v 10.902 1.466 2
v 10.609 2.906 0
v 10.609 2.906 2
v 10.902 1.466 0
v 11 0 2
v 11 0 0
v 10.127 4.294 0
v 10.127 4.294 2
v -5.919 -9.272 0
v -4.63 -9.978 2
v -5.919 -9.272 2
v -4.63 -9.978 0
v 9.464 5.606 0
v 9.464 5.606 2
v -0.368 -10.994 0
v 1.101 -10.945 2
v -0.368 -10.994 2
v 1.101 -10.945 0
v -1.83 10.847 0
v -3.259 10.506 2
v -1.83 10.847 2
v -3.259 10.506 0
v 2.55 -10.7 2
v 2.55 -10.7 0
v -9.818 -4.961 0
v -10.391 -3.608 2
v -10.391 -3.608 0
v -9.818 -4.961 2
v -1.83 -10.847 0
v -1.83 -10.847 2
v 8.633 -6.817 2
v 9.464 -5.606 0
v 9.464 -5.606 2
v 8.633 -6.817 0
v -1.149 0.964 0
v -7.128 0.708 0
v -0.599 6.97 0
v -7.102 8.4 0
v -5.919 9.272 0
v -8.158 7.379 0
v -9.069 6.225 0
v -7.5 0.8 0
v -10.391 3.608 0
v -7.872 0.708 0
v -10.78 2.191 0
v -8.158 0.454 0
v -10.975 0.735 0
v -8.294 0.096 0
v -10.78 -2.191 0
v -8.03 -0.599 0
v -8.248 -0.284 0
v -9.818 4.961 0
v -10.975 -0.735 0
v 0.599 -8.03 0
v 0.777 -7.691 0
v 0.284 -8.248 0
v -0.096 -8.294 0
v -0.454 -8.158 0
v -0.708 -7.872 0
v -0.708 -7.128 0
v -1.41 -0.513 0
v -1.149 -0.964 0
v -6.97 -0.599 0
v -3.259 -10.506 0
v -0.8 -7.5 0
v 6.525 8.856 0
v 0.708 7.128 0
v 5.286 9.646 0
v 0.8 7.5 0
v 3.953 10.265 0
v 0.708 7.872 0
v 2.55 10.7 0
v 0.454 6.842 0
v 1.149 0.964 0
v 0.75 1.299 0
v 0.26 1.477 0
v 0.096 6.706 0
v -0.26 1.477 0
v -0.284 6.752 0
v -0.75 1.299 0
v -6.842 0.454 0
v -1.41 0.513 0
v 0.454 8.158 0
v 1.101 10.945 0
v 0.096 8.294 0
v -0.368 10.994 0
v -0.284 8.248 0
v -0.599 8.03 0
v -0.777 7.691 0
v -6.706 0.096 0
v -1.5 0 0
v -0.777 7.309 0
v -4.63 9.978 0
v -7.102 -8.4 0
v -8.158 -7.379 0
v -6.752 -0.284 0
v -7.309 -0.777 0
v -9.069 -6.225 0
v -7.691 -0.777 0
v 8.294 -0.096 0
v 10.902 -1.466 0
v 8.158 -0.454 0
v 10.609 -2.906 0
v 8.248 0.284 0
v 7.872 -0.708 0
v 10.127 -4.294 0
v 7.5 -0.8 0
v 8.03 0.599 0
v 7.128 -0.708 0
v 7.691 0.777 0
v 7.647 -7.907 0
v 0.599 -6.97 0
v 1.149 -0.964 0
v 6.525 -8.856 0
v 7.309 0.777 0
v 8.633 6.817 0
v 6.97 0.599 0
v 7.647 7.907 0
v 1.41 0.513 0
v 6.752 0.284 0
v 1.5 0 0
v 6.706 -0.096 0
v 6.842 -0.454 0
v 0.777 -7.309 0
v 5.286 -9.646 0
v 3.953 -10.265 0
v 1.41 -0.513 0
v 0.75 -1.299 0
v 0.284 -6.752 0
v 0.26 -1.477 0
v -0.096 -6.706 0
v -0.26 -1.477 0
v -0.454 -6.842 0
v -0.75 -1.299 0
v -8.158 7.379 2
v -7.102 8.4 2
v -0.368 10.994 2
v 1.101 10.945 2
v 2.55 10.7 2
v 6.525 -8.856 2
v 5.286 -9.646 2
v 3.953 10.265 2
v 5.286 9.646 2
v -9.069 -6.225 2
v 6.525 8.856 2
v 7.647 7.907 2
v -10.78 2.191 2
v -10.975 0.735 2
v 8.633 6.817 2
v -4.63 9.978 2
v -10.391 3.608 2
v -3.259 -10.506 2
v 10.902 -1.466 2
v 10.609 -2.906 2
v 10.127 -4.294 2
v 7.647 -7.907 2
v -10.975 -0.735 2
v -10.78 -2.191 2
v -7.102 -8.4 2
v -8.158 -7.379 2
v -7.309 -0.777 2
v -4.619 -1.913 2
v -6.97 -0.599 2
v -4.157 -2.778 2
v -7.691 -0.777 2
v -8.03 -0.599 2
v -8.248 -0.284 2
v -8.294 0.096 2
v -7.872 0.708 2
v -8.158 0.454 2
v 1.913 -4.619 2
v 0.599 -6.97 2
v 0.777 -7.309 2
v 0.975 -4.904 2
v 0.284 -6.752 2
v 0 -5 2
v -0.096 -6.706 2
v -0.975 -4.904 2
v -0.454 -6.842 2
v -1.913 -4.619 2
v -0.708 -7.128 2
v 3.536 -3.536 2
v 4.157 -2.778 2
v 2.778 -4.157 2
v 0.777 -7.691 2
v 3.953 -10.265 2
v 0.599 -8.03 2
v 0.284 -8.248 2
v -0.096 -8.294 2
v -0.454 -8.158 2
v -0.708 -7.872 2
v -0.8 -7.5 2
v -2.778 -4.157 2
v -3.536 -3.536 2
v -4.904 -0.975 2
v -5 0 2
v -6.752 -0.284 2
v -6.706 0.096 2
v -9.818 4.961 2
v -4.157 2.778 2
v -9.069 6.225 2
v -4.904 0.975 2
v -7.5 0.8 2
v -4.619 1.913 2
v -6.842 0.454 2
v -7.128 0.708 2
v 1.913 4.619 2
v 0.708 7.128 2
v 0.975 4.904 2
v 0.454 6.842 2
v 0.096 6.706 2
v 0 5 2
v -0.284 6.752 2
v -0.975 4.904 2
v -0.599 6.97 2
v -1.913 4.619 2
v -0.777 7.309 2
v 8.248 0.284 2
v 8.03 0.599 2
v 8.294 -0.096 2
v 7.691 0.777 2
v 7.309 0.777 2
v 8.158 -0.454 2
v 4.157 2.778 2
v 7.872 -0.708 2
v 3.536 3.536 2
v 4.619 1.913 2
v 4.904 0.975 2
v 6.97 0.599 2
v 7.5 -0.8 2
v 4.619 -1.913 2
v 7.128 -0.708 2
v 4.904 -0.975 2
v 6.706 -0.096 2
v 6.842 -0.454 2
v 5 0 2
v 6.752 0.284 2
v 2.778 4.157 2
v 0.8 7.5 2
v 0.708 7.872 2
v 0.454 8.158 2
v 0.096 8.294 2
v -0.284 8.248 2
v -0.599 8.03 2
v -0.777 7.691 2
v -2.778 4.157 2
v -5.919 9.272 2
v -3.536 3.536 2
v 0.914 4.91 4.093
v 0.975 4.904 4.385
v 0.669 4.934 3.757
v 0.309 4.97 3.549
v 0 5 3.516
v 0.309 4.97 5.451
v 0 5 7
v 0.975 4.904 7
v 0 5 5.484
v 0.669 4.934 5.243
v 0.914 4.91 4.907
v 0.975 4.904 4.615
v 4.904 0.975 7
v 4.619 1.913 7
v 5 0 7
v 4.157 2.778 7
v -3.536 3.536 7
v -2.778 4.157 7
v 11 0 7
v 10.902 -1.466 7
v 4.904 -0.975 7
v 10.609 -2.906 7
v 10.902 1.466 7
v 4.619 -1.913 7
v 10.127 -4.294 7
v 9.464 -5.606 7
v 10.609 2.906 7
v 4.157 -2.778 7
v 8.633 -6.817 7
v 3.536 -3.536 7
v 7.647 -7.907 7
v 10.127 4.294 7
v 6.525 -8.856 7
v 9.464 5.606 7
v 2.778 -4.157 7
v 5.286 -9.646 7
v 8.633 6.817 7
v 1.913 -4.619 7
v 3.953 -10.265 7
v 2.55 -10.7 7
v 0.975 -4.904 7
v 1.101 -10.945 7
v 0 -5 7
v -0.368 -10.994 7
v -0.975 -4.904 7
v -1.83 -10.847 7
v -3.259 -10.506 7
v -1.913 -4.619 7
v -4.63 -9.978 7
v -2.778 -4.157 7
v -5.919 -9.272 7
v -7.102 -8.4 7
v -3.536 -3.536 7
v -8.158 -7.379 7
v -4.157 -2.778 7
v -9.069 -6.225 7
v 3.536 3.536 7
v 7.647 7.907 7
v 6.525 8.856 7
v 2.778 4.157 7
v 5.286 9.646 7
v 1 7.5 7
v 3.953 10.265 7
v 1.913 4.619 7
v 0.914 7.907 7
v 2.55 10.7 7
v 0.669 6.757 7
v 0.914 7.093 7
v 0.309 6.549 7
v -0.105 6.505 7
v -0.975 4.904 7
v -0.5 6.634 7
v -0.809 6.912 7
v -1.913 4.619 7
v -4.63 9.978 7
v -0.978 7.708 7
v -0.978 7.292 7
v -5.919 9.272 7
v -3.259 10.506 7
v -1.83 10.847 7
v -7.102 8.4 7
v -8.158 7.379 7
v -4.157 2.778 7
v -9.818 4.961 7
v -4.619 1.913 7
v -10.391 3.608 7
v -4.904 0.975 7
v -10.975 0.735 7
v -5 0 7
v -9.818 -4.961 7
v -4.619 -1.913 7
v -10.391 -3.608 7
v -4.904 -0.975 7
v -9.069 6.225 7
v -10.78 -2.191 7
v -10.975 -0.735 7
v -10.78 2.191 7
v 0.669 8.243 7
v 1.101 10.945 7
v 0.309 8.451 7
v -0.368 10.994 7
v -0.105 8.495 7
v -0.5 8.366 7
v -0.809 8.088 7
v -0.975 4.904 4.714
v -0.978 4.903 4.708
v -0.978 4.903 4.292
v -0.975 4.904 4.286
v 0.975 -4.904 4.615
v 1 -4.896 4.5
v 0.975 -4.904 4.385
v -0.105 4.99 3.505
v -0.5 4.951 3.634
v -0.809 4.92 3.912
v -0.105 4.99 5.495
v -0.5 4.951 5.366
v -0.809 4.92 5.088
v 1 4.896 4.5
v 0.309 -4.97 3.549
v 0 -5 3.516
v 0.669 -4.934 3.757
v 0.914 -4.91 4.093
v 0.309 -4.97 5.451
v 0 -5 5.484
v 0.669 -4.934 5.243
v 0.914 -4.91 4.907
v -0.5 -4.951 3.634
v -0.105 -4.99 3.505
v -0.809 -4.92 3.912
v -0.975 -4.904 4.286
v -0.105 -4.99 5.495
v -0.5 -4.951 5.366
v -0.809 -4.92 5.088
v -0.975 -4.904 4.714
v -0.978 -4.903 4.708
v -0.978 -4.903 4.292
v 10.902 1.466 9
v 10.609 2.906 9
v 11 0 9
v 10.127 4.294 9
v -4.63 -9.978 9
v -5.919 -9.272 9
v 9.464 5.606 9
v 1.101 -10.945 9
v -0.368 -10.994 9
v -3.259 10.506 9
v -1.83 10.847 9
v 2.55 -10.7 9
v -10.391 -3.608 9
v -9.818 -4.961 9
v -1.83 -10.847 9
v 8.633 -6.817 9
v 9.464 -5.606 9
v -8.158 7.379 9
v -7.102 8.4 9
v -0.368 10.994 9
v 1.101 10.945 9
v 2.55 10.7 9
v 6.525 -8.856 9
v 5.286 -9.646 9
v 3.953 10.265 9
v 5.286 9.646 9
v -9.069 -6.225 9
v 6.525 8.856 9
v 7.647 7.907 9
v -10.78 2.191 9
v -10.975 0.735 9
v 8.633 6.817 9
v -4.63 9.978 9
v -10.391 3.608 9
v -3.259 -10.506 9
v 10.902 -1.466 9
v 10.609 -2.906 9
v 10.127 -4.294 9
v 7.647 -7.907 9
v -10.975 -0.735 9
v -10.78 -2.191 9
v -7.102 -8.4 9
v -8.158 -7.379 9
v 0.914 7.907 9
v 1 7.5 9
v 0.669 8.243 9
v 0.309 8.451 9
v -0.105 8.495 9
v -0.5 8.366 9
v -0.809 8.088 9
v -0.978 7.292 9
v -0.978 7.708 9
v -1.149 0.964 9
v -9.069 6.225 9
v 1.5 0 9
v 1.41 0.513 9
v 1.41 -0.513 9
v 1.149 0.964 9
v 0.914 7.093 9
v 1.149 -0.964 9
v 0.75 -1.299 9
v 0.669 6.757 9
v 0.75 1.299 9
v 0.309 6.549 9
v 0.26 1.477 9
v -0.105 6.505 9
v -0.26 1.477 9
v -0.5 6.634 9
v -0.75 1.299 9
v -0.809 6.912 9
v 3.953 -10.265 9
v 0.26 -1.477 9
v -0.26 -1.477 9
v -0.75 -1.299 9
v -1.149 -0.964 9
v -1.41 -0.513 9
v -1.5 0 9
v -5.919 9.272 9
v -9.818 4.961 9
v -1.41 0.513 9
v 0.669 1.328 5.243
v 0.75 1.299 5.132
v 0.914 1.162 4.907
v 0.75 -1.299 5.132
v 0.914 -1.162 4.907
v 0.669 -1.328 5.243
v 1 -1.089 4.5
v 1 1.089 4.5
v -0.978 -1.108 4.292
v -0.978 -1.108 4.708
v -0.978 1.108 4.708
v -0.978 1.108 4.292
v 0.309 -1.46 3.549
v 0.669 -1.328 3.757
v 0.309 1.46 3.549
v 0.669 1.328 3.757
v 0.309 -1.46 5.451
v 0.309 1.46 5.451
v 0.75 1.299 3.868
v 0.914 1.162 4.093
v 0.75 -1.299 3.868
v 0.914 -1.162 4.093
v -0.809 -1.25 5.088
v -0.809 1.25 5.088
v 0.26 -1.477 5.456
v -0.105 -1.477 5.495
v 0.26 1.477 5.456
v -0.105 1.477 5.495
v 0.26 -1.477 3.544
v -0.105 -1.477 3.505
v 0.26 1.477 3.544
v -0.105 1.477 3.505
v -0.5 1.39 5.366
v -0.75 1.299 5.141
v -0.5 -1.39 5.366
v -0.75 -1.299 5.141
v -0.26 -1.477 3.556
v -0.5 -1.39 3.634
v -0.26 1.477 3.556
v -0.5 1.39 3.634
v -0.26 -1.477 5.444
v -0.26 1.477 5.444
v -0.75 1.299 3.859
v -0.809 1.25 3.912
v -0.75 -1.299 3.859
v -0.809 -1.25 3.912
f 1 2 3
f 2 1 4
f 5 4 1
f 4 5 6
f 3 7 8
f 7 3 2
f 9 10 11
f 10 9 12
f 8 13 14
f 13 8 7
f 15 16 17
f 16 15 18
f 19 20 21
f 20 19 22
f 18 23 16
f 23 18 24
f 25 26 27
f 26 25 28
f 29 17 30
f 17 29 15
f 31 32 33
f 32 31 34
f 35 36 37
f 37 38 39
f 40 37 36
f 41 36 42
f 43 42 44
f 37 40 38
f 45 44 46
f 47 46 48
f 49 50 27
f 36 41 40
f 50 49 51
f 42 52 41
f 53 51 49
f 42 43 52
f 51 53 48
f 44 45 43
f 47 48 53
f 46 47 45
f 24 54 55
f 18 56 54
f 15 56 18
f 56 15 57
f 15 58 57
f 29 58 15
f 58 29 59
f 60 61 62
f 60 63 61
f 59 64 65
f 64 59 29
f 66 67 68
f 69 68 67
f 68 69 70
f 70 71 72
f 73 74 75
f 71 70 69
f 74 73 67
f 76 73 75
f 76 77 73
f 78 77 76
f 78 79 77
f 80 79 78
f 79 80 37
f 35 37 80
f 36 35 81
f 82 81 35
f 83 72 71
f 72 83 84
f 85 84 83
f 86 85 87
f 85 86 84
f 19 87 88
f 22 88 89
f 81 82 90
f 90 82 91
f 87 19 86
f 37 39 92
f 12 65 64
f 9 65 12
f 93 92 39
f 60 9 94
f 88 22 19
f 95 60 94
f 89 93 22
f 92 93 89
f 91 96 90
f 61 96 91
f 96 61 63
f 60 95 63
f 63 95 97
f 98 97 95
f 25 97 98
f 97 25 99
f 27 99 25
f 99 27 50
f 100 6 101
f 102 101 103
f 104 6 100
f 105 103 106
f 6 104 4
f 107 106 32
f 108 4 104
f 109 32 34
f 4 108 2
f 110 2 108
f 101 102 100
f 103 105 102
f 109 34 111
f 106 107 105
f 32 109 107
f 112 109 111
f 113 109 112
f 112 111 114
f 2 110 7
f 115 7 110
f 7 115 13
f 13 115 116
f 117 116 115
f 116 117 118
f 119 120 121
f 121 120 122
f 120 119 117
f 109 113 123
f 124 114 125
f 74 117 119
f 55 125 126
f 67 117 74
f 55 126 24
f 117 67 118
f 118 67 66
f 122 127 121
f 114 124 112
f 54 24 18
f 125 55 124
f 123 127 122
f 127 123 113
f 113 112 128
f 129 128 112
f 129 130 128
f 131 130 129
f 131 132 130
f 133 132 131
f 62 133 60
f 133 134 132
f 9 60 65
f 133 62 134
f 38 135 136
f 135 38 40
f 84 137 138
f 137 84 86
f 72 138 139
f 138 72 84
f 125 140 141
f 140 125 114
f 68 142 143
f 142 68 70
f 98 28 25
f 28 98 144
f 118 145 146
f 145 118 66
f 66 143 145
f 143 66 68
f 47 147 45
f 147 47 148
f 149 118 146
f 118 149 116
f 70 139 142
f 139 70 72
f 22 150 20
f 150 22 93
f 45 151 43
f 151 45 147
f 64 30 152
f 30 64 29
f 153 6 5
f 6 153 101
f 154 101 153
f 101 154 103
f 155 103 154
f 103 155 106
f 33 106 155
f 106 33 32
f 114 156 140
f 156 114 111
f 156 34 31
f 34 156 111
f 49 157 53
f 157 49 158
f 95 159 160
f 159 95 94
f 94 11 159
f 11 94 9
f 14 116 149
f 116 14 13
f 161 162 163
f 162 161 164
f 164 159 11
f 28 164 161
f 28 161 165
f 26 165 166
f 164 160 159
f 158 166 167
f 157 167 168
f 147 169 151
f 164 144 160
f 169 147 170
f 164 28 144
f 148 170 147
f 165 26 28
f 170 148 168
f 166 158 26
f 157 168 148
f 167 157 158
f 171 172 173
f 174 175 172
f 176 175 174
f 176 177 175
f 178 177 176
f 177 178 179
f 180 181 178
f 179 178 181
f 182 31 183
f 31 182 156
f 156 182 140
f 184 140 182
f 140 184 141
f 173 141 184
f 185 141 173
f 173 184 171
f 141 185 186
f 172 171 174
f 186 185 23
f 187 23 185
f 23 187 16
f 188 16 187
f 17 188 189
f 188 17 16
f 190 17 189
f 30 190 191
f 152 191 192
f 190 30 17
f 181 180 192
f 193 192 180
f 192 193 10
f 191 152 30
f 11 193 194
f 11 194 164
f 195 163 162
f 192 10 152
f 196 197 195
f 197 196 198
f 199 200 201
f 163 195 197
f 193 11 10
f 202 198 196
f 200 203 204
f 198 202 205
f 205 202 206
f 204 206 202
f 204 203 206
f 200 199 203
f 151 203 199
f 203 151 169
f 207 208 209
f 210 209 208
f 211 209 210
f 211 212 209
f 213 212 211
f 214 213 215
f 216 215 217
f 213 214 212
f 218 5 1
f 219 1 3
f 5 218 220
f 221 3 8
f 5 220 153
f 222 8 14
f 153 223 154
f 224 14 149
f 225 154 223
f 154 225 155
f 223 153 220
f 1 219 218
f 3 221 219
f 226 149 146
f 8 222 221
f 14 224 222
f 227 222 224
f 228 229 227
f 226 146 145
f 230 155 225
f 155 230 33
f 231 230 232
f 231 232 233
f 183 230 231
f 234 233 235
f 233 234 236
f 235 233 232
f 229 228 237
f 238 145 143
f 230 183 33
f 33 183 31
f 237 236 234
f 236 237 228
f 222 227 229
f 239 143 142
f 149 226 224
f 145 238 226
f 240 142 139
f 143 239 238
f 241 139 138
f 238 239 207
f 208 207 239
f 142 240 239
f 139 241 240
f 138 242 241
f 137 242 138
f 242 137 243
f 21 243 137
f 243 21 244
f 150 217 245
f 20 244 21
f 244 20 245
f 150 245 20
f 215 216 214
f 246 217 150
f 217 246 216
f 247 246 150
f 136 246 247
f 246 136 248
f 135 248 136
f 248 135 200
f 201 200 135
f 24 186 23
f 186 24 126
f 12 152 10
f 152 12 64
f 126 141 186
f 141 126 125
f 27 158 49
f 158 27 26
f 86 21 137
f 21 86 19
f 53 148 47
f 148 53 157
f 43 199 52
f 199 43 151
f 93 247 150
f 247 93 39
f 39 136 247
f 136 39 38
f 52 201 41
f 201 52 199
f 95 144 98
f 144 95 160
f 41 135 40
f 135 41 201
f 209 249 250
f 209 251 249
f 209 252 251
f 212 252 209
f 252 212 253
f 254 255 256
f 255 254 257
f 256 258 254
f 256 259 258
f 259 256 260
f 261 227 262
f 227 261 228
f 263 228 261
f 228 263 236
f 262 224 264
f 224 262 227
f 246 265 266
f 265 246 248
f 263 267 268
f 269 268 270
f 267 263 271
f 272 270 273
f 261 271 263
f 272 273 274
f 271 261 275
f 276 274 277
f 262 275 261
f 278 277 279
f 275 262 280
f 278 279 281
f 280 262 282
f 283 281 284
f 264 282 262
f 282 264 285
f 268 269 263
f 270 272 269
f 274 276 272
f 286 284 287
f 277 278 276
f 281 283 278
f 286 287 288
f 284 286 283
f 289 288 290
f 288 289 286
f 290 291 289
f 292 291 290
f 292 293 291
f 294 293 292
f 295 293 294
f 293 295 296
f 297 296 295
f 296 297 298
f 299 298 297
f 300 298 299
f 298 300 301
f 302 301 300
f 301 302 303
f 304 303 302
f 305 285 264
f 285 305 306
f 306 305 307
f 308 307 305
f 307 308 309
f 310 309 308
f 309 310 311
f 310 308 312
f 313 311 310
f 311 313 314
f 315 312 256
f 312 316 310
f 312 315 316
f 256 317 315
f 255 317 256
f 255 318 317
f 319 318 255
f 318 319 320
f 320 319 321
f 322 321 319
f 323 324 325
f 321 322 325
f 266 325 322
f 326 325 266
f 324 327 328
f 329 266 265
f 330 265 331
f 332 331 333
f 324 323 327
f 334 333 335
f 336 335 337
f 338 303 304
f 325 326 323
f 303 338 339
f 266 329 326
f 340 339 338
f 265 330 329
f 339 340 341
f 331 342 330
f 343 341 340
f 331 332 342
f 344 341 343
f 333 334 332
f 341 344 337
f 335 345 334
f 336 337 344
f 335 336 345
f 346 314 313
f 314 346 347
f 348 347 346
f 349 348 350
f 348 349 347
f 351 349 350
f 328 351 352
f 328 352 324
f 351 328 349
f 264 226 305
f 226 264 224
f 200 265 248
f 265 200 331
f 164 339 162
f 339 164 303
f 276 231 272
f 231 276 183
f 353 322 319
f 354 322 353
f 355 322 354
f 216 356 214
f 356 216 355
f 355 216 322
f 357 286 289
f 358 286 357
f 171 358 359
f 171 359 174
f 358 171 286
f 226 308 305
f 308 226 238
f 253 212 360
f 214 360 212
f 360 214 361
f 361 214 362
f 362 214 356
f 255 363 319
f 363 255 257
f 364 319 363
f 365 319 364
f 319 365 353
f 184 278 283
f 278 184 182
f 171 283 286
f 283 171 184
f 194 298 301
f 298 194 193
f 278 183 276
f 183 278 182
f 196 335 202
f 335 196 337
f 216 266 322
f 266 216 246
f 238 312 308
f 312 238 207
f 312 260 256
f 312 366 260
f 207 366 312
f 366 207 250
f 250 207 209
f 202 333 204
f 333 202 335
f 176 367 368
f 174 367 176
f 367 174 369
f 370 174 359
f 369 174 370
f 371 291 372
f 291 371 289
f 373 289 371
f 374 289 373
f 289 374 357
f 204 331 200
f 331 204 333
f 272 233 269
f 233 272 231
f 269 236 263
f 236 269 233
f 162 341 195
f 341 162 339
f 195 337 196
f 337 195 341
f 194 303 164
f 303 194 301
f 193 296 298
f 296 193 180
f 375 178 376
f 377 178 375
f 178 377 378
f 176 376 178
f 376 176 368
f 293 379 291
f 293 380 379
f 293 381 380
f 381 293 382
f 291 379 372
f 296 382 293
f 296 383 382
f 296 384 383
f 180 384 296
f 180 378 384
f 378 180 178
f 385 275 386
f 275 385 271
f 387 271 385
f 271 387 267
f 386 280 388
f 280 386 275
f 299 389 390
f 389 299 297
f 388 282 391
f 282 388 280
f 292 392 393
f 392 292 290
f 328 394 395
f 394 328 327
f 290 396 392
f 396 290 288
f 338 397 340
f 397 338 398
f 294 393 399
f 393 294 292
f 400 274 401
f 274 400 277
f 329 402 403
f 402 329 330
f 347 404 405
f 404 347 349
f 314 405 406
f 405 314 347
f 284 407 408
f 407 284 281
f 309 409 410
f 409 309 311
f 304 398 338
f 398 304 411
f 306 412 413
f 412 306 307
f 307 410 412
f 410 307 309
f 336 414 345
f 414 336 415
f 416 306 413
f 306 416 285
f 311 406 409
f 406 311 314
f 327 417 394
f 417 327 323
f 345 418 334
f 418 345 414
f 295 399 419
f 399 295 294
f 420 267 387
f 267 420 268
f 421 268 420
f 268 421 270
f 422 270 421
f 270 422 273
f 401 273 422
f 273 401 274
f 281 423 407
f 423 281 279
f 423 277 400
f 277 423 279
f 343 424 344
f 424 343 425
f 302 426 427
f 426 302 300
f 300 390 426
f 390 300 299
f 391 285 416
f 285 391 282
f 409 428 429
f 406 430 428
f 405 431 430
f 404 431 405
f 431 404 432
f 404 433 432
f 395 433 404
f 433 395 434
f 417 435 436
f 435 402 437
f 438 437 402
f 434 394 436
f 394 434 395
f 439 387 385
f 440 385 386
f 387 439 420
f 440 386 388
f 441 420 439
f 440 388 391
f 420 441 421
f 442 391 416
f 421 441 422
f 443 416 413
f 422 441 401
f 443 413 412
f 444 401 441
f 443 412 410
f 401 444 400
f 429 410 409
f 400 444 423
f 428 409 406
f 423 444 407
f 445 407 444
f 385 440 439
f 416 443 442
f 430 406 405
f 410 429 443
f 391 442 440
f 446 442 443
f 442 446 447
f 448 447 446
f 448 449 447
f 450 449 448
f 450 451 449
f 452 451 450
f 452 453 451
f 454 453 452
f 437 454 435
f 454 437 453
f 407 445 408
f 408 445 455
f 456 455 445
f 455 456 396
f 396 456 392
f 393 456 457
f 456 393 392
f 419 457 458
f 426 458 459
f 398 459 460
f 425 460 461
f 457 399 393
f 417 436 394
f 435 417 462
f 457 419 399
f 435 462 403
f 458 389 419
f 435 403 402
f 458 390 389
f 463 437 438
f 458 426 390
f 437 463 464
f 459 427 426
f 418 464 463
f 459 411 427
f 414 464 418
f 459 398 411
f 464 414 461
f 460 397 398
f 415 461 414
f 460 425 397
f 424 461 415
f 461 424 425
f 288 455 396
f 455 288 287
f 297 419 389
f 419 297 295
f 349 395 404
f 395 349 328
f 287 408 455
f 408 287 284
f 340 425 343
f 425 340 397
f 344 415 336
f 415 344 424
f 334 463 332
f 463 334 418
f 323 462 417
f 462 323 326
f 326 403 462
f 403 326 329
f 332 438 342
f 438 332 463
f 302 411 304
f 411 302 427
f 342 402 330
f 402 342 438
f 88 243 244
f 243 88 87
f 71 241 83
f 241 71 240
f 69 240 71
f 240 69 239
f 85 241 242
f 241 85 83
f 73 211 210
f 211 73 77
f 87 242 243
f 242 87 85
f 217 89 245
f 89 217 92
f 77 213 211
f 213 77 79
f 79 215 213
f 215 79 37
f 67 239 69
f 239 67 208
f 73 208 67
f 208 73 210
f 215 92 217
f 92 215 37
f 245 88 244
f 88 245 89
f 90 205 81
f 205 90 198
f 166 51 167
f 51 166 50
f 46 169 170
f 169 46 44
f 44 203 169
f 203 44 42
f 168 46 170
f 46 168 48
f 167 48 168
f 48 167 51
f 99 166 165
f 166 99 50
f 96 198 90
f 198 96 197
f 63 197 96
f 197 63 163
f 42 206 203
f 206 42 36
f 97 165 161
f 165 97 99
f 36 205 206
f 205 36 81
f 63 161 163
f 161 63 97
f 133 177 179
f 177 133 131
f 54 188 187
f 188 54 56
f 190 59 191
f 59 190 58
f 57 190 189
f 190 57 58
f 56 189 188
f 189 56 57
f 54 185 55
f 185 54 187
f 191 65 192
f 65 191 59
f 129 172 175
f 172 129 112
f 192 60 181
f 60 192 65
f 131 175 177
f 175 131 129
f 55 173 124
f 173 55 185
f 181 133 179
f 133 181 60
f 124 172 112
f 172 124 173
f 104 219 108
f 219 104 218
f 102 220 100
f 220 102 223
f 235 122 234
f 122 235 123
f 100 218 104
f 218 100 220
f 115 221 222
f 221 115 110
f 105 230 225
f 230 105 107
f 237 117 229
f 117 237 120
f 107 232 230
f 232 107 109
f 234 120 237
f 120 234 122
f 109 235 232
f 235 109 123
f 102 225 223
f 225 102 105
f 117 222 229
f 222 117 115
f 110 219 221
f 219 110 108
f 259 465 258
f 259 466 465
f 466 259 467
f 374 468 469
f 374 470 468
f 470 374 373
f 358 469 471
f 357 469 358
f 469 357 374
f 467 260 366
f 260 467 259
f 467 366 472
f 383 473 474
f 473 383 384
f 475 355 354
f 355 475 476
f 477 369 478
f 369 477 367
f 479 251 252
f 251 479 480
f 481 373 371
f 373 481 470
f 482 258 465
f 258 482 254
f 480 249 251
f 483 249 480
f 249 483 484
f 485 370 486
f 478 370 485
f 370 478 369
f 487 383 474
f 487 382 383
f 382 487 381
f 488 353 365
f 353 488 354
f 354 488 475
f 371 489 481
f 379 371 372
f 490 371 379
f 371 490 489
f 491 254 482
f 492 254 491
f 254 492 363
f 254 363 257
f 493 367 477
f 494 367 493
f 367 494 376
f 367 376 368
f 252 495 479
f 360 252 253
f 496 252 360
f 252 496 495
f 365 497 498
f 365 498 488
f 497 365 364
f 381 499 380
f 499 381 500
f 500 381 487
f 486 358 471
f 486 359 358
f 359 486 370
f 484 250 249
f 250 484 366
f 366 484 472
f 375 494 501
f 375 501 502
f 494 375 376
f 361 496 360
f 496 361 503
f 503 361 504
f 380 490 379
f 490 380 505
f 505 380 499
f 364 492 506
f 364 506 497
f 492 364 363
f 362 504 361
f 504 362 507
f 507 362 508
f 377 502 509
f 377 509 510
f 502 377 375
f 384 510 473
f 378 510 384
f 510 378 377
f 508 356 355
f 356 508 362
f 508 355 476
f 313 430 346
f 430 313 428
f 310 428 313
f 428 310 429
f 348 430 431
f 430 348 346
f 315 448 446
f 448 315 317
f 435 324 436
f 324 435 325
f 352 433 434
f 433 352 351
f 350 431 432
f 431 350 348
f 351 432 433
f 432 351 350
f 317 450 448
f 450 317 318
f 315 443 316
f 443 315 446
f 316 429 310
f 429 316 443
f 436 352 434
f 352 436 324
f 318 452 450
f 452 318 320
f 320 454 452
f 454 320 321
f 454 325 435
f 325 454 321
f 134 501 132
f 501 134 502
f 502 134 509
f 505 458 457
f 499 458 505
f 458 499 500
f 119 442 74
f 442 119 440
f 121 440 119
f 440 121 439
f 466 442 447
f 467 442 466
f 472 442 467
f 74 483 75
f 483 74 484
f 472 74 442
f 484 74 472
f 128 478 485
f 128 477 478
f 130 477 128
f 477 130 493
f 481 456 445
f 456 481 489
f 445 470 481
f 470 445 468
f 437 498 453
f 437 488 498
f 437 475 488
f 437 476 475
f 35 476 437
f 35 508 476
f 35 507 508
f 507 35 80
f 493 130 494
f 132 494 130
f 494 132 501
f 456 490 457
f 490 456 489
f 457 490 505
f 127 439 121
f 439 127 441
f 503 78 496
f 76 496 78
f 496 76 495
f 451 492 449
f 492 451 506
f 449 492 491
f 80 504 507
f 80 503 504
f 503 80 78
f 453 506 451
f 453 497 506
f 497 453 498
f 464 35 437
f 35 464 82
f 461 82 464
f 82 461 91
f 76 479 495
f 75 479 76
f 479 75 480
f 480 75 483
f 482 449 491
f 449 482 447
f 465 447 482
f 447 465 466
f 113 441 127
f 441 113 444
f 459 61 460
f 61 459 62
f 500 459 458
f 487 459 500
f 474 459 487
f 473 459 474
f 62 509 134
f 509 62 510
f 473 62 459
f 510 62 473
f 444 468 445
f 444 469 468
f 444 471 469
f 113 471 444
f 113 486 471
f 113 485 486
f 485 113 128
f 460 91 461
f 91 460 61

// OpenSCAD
// file: ../motors/MN5212.scad
use <../utils.scad>

module MN5212(){

	//render(){
		difference(){
			union(){
				translate([0,0, 42.5 / 2 - 23 / 2 - 4.9 - 6])
					cylinder(
						h = 23,
						r = 59 / 2,
						$fa = fa(59 / 2),
						center = true);
				translate([0,0, 42.5 / 2 - 4.9 / 2 - 6])
					cylinder(
						h = 4.9,
						r1 = 59 / 2,
						r2 = 24.8 / 2,
						$fa = fa(59 / 2),
						center = true);
				translate([0,0, - 42.5 / 2 + 5.6 / 2 + 3])
					cylinder(
						h = 5.6,
						r1 = 44 / 2,
						r2 = 59 / 2,
						$fa = fa(59 / 2),
						center = true);
				translate([0, 0, 42.5 / 2 - 3])
					cylinder(
						h = 6,
						r = 4 / 2,
						$fa = fa(4 / 2),
						center = true);
				translate([0, 0, - 42.5 / 2 + 1.5])
					cylinder(
						h = 3,
						r = 6 / 2,
						$fa = fa(6 / 2),
						center = true);
			}
			union(){
				for(i = [0:90:270])
					rotate([0, 0, i])
						translate([0, 25 / 2, -16.25 - 0.025])
							cylinder(
								h = 4,
								r = 3 / 2,
								$fa = fa(3 / 2),
								center = true);
				for(i = [0:120:240])
					rotate([0, 0, i])
						translate([0, 17 / 2, 12.75 + 0.025])
							cylinder(
								h = 5,
								r = 3 / 2,
								$fa = fa(3 / 2),
								center = true);
				rotate([0, 0, 30])
					translate([0, 12 / 2, 12.75 + 0.025])
						cylinder(
							h = 5,
							r = 3 / 2,
							$fa = fa(3 / 2),
							center = true);
				rotate([0, 0, 30 + 180])
					translate([0, 12 / 2, 12.75 + 0.025])
						cylinder(
							h = 5,
							r = 3 / 2,
							$fa = fa(3 / 2),
							center = true);
			}
		}

	//}

}

MN5212();
// file: ../servos/TGY_4805_2PA.scad
use <../utils.scad>

module TGY_4805_2PA(){

	length = 40;
	width = 20;
	depth = 36.4;
	wing_width = 58;
	wing_thick = 2.45;
	wing_height = 27.7;
	shaft_offset = 9.5;
	hole_seperation = 9.2;
	hole_spacing = 50;
	shaft_height = 40;
	shaft_length = 3.6;
	hole_diameter = 4.8;

	module mounting_hole(){
		mh_rad = hole_diameter / 2;
		translate(
			[
				hole_spacing / 2,
				0,
				-depth / 2 + wing_height - wing_thick / 2
			])
			cylinder(h = 5, r = mh_rad, $fa = fa(mh_rad), center = true);
	}

	difference(){
		union(){
			cube([length, width, depth], center = true);
			translate([0, 0, -depth / 2 + wing_height - wing_thick / 2])
				cube([wing_width, width, wing_thick], center = true);
			translate(
				[
					- length / 2 + shaft_offset,
					0,
					shaft_height - length / 2 + shaft_length / 2
				])
				cylinder(
					h = shaft_length,
					r = 1.5,
					$fa = fa(1.5),
					center = true);
		}	union(){

			translate([0, hole_seperation / 2, 0]){
				mounting_hole();
				mirror() mounting_hole();
			}
			translate([0, -hole_seperation / 2, 0]){
				mounting_hole();
				mirror() mounting_hole();
			}
		}
	}
}

module TGY_4805_2PA_translate(){
	length = 40;
	shaft_offset = 9.5;
	shaft_height = 40;
	shaft_length = 3.6;
	translate(
		[
				- length / 2 + shaft_offset,
				0,
				shaft_height - length / 2 + shaft_length / 2
		]) children();
}

TGY_4805_2PA();
// file: ../servos/HS_5065MG.scad
use <../utils.scad>

module HS_5065MG(){

	length = 23.75;
	width = 11.68;
	depth = 20.32;
	wing_width = 32.38;
	wing_thick = 2;
	wing_offset = 1;
	shaft_offset = 6;
	hole_spacing = 28.32;
	hole_spacing_2 = 27;
	hole_2_wide = 6;
	hole_diameter = 2;
	shaft_height = 26.16;
	shaft_length = 2;

	module mounting_hole(){
		mh_rad = hole_diameter / 2;
		translate(
			[
				hole_spacing / 2,
				0,
				depth / 2 - wing_thick / 2
			])
			cylinder(h = 5, r = mh_rad, $fa = fa(mh_rad), center = true);
		translate(
			[
				hole_spacing_2 / 2,
				hole_2_wide / 2,
				depth / 2 - wing_thick / 2
			])
			cylinder(h = 5, r = mh_rad, $fa = fa(mh_rad), center = true);
		translate(
			[
				hole_spacing_2 / 2,
				- hole_2_wide / 2,
				depth / 2 - wing_thick / 2
			])
			cylinder(h = 5, r = mh_rad, $fa = fa(mh_rad), center = true);
	}

	difference(){
		union(){
			cube([length, width, depth], center = true);
			translate([0, 0, depth / 2 - wing_thick / 2 - wing_offset])
				cube([wing_width, width, wing_thick], center = true);
			translate(
				[
					- length / 2 + shaft_offset,
					0,
					depth / 2 + 3.8 + 1.9 + shaft_length / 2
				])
				cylinder(
					h = shaft_length,
					r = 1.5,
					$fa = fa(1.5),
					center = true);
			translate(
				[
					- length / 2 + shaft_offset,
					0,
					depth / 2 + 3.8 / 2
				])
				cylinder(
					h = 3.8,
					r = 11.3 / 2,
					$fa = fa(11.3 / 2),
					center = true);
			translate(
				[
					- length / 2 + shaft_offset,
					0,
					depth / 2 + 3.8 + 1.9 / 2
				])
				cylinder(
					h = 1.9,
					r1 = 11.3 / 2,
					r2 = 8 / 2,
					$fa = fa(11.3 / 2),
					center = true);
		}	union(){

			mounting_hole();
			mirror() mounting_hole();
		}
	}
}

module HS_5065MG_arm(){

	hole_size = 1.5;
	hole_spacing = 3;
	hole_offset = 9.6;

	difference(){
		union(){
			translate([0, 0, 4.4 / 2])
				cylinder(
					h = 4.4,
					r = 8 / 2,
					$fa = fa(8 / 2),
					center = true);
			hull(){
				translate([0, 0, 4.4 - 1.8 / 2])
					cylinder(
						h = 1.8,
						r = 8 / 2,
						$fa = fa(8 / 2),
						center = true);
				translate([18.8, 0, 4.4 - 1.8 / 2])
					cylinder(
						h = 1.8,
						r = 5 / 2,
						$fa = fa(5 / 2),
						center = true);
			}
		}
		union(){
			for(i = [0:3]){
				translate([hole_offset + hole_spacing * i, 0, 4.4 - 1.8 / 2])
					cylinder(
						h = 5,
						r = hole_size / 2,
						$fa = fa(hole_size / 2),
						center = true);
			}
		}
	}
}

module HS_5065MG_shaft_translate(){
	translate(
		[
			- 23.75 / 2 + 6,
			0,
			20.32 / 2 + 3.8 + 1.9
		])
			children();
}

HS_5065MG();
HS_5065MG_shaft_translate() HS_5065MG_arm();
// file: ../servos/LS_0006_servo.scad
// Author Michael Marques (DrYerzinia)

use <../utils.scad>

module ls_0006_servo(){
	
	length = 21.4;
	depth = 19.9;
	thickness = 11.65;

	gear_height = 2.6;
	gear_bump_height = 0.7;
	gear_bump_diameter = 1.97;
	gear_outer_bump_diameter = 6;
	gear_bump_offset = 12.2;

	shaft_height = 2.4;
	shaft_diameter = 3.74;
	shaft_offset = thickness / 2;
	shaft_screw_diameter = 1.3;
	
	wing_outer_width = 8.5;
	wing_top_off = 3.8;
	wing_length = 3.8;
	wing_thickness = 1.2;
	wing_hole_diameter = 1.85;
	wing_hole_edge_dist = 2;

	module wing_hole(){
		translate(
			[
				length / 2 + wing_hole_edge_dist,
				0,
				depth/2 - wing_top_off - wing_thickness / 2
			])
			cylinder(
				h = wing_thickness + 1,
				r = wing_hole_diameter / 2,
				$fn = 16,
				center = true);
	}

	module wing(){
		translate(
			[
				length / 2,
				thickness / 2,
				depth/2 - wing_top_off - wing_thickness
			])
			rotate([0,0,-90])
				trapezoid(
					thickness,
					wing_outer_width,
					wing_length,
					wing_thickness);
	}

	// Body
	cube([length, thickness, depth], center = true);

	difference(){
		union(){

			wing();
			mirror() wing();

			// Gear Bumps
			translate([0, 0, depth/2 + gear_height / 2]){
				translate([length / 2 - gear_bump_offset, 0, 0])
					cylinder(
						h = gear_height,
						r = gear_outer_bump_diameter / 2,
						$fn = 16,
						center = true);
				translate([length / 2 - gear_bump_offset, 0, gear_height/2 + gear_bump_height / 2])
					cylinder(
						h = gear_bump_height,
						r = gear_bump_diameter / 2,
						$fn = 16,
						center = true);
				translate([length / 2 - shaft_offset, 0, 0])
					cylinder(
						h = gear_height,
						r = thickness / 2,
						$fn = 32,
						center = true);
				// Shaft
				translate([length / 2 - shaft_offset, 0, gear_height])
					cylinder(
						h = shaft_height,
						r = shaft_diameter / 2,
						$fn = 16,
						center = true);
			}

		}
		union(){

			wing_hole();
			mirror() wing_hole();

			// Shaft_hole
			translate(
				[
					length / 2 - shaft_offset,
					0,
					depth/2 + gear_height * (3 / 2) + 0.5])
				cylinder(
					h = shaft_height + 1,
					r = shaft_screw_diameter / 2,
					$fn = 16,
					center = true);

		}
	}

}

module translate_ls_0006_attachment(){

	length = 21.4;
	thickness = 11.65;
	shaft_offset = thickness / 2;
	depth = 19.9;
	float = 3.3;

	translate([length / 2 - shaft_offset, 0, depth / 2 + float])
		children();

}

module bar_attachment(){

	height = 3.75;
	bar_length = 14.7;
	bar_thickness = 1.6;
	inner_radius = 5.9;
	outer_radius = 3.95;
	shaft_diameter = 3.7;
	upper_void_diameter = 4.8;
	screw_diameter = 2;
	hole_spacing = 2;
	hole_4_diameter = 1.2;
	hole_diameter = 1;
	hole_start_off = 4.7;
	top_void_depth = 0.67;
	bottom_void_depth = 1.84;

	translate([0, 0, height / 2]){
		difference(){
			union(){

				translate([0, inner_radius / 2, height / 2 - bar_thickness])
					rotate([0,0,-90])
						trapezoid(
							inner_radius,
							outer_radius,
							bar_length,
							bar_thickness);

				cylinder(
					h = height,
					r = inner_radius / 2,
					$fn = 16,
					center = true);

				translate([bar_length, 0, height / 2 - bar_thickness / 2])
					cylinder(
						h = bar_thickness,
						r = outer_radius / 2,
						$fn = 16,
						center = true);

			}
			union(){
				// screwhole
				cylinder(
					h = height + 1,
					r = screw_diameter / 2,
					$fn = 16,
					center = true);
				// voids
				translate([0, 0, height / 2 - top_void_depth / 2 + 0.5])
					cylinder(
						h = top_void_depth + 1,
						r = upper_void_diameter / 2,
						$fn = 16,
						center = true);
				translate([0, 0,  - bottom_void_depth / 2 - 0.5])
					cylinder(
						h = bottom_void_depth + 1,
						r = shaft_diameter / 2,
						$fn = 16,
						center = true);

				for(i = [0:4]){
					dia = (i != 3) ? hole_diameter : hole_4_diameter;
					translate(
						[
							hole_start_off + hole_spacing * i,
							0,
							height / 2 - bar_thickness / 2])
						cylinder(
							h = bar_thickness + 1,
							r = dia / 2,
							$fn = 16,
							center = true);
				}

			}
		}
	}

}

ls_0006_servo();
translate_ls_0006_attachment() bar_attachment();
// file: ../servos/parallax_continuous_rotation_servo.scad
// Author Michael Marques (DrYerzinia)

module parallax_continuous_rotation_servo(){

	depth = 37.7;
	length = 40.75;
	width = 19.75;

	mount_height = 2.7;
	mount_extent = 6.1;
	mount_from_top = 7.7;

	mount_hole_diameter = 4.46;
	mount_hole_spacing = 14.4 - mount_hole_diameter;

	shaft_diameter = 5.8;
	shaft_offset = 10;
	shaft_length = 3.5;

	module mounting_hole(){

			translate(
				[
					length / 2 + 5,
					mount_hole_spacing / 2,
					depth / 2 - mount_height / 2 - mount_from_top
				]
				)
				cylinder(
					h = mount_height + 1,
					r = mount_hole_diameter / 2,
					$fn=16,
					center = true);
	}

	difference(){
		union(){

			// Body
			cube([length,width,depth], center = true);

			// Mounting wings
			translate(
				[
					0,
					0,
					depth / 2 - mount_height / 2 - mount_from_top
				])
				cube(
					[
						length + mount_extent * 2,
						width,
						mount_height
					],
					center = true);

			// Shaft
			translate(
				[
					length / 2 - shaft_offset,
					0,
					depth / 2 + shaft_length / 2
				]
				)
				cylinder(
					h = shaft_length,
					r = shaft_diameter / 2,
					$fn = 16,
					center = true
				);

		}
		union(){

			// Mounting Holes
			mounting_hole();
			mirror()
				mounting_hole();

			translate([0,-mount_hole_spacing,0]){
				mounting_hole();
				mirror()
					mounting_hole();
			}
		}
	}

}

module translate_shaft(){

	depth = 37.7;
	length = 40.75;

	shaft_offset = 10;

	translate(
		[
			length / 2 - shaft_offset,
			0,
			depth / 2
		])
		children();
}

module round_servo_attachment(){

	height = 6;
	diameter = 20.8;
	inner_diameter = 8.6;
	plate_thickness = 2.45;

	float = 2;

	depth = 37.7;
	length = 40.75;

	shaft_offset = 10;

	plate_hole_spacing = 14.5;
	plate_hole_diameter = 1.4;
	plate_hole_minor_spacing = 3.5;

	screw_hole_diameter = 3;

	inner_diameter = 8;
	
	top_depth = 1.8;
	bottom_depth = 3.4;

	void_diameter = 5.8;

	module plate_hole(){
		cylinder(
			h = plate_thickness + 1,
			r = plate_hole_diameter / 2,
			$fn = 16,
			center = true
		);
	}

	module plate_hole_group(){
		translate([0, 0, height / 2 - plate_thickness / 2]){
			translate([0, plate_hole_spacing / 2, 0]){
					plate_hole();
					translate([- plate_hole_minor_spacing, 0, 0])
						plate_hole();
					translate([  plate_hole_minor_spacing, 0, 0])
						plate_hole();
			}
		}
	}

	translate(
		[
			length / 2 - shaft_offset,
			0,
			depth / 2 + height / 2 + float
		]
		)
		difference(){

			union(){

				// inner shaft
				cylinder(
					h = height,
					r = inner_diameter / 2,
					$fn = 16,
					center = true
				);

				// top
				translate([0, 0, height / 2 - plate_thickness / 2])
					cylinder(
						h = plate_thickness,
						r = diameter / 2,
						$fn = 32,
						center = true
					);
			}

			union(){

				// plate holes
				for(ang = [0:3]){
					rotate([0,0, ang * 90])
						plate_hole_group();
				}

				// screw hole
				cylinder(
					h = height + 1,
					r = screw_hole_diameter / 2,
					$fn = 16,
					center = true
				);

				// inner voids
				translate([0, 0, height / 2 - top_depth / 2 + 1])
					cylinder(
						h = top_depth + 1,
						r = void_diameter / 2,
						$fn = 16,
						center = true
					);
				translate([0, 0, -1])
					cylinder(
						h = bottom_depth + 1,
						r = void_diameter / 2,
						$fn = 16,
						center = true
					);

			}

		}

}

parallax_continuous_rotation_servo();
round_servo_attachment();
// file: ../hardware.scad
 // Author Michael Marques (DrYerzinia)

// http://www.ebay.com/itm/10-PCS-683-3x7x2-mm-Metal-OPEN-PRECISION-Miniature-Ball-Bearing-3-7-2-/291206307942?hash=item43cd3fa066:m:mCi6eovrGVk_CjIUjlhw8yg
// E-Bay empire.rc

module washer_M3_7x3_2x0_5mm(){

	difference(){
		cylinder(
			h = 0.5,
			r = 7 / 2,
			$fn = 16,
			center = true);
		cylinder(
			h = 0.5 + 0.1,
			r = 3.2 / 2,
			$fn = 16,
			center = true);
	}

}

module bearing_3x7x2mm(){

	difference(){
		cylinder(
			h = 2,
			r = 7 / 2,
			$fn = 16,
			center = true);
		cylinder(
			h = 2 + 1,
			r = 3 / 2,
			$fn = 16,
			center = true);
	}

}

module bearing_5x8x2_5mm(){

	difference(){
		cylinder(
			h = 2.5,
			r = 8 / 2,
			$fn = 16,
			center = true);
		cylinder(
			h = 2.5 + 1,
			r = 5 / 2,
			$fn = 16,
			center = true);
	}

}

module bearing_8x16x5mm(){

	difference(){
		cylinder(
			h = 5,
			r = 16 / 2,
			$fn = 16,
			center = true);
		cylinder(
			h = 5 + 1,
			r = 8 / 2,
			$fn = 16,
			center = true);
	}

}


bearing_5x8x2_5mm();
// file: ../utils.scad
// http://forum.openscad.org/Creating-pie-pizza-slice-shape-need-a-dynamic-length-array-td3148.html

module pie_slice(r, start_angle, end_angle) {
    R = r * sqrt(2) + 1;
    a0 = (4 * start_angle + 0 * end_angle) / 4;
    a1 = (3 * start_angle + 1 * end_angle) / 4;
    a2 = (2 * start_angle + 2 * end_angle) / 4;
    a3 = (1 * start_angle + 3 * end_angle) / 4;
    a4 = (0 * start_angle + 4 * end_angle) / 4;
    if(end_angle > start_angle)
        intersection() {
        circle(r, $fa = fa(r));
        polygon([
            [0,0],
            [R * cos(a0), R * sin(a0)],
            [R * cos(a1), R * sin(a1)],
            [R * cos(a2), R * sin(a2)],
            [R * cos(a3), R * sin(a3)],
            [R * cos(a4), R * sin(a4)],
            [0,0]
       ]);
    }
}

// https://github.com/openscad/openscad/issues/29

module rotate_about(v,a) {
	translate(v) rotate(a) translate(-v) children();
}

module rotate_about_axis(v, ang, axis) {
	translate(v) rotate(ang, axis) translate(-v) children();
}

// https://github.com/robofun/openscad-utils/blob/master/trapezoid.scad

module trapezoid(width_base, width_top, height, thickness){
	

  linear_extrude(height = thickness)
		polygon(
			points =
				[
					[0,0],
					[width_base,0],
					[width_base-(width_base-width_top)/2,height],
					[(width_base-width_top)/2,height]
				],
				paths=[[0,1,2,3]]); 
  
}

// http://forum.openscad.org/fe-Tolerance-based-arc-approximation-td14212.html

function fa(r)=($fn>0)?360/$fn:($fe>0)?($fe<r)?min(45,2*acos(1-$fe/r)):45:$fa; 
// file: ../render_settings.scad
// Author Michael Marques (DrYerzinia)

// Lulzbot Mini tolerances
// x/y 0.1mm
// z   0.05mm
//
// 0.1mm   preview tolerance
// 0.025mm export  tolerance

$fs = 0.01;
$fn = undef;
$fa = 360 / 5;

$fe = 0.025;	// export
// main file
// Author Michael Marques (DrYerzinia)

include <../render_settings.scad>

use <../BB8.scad>

Body_P15_motor_lift_drum();
